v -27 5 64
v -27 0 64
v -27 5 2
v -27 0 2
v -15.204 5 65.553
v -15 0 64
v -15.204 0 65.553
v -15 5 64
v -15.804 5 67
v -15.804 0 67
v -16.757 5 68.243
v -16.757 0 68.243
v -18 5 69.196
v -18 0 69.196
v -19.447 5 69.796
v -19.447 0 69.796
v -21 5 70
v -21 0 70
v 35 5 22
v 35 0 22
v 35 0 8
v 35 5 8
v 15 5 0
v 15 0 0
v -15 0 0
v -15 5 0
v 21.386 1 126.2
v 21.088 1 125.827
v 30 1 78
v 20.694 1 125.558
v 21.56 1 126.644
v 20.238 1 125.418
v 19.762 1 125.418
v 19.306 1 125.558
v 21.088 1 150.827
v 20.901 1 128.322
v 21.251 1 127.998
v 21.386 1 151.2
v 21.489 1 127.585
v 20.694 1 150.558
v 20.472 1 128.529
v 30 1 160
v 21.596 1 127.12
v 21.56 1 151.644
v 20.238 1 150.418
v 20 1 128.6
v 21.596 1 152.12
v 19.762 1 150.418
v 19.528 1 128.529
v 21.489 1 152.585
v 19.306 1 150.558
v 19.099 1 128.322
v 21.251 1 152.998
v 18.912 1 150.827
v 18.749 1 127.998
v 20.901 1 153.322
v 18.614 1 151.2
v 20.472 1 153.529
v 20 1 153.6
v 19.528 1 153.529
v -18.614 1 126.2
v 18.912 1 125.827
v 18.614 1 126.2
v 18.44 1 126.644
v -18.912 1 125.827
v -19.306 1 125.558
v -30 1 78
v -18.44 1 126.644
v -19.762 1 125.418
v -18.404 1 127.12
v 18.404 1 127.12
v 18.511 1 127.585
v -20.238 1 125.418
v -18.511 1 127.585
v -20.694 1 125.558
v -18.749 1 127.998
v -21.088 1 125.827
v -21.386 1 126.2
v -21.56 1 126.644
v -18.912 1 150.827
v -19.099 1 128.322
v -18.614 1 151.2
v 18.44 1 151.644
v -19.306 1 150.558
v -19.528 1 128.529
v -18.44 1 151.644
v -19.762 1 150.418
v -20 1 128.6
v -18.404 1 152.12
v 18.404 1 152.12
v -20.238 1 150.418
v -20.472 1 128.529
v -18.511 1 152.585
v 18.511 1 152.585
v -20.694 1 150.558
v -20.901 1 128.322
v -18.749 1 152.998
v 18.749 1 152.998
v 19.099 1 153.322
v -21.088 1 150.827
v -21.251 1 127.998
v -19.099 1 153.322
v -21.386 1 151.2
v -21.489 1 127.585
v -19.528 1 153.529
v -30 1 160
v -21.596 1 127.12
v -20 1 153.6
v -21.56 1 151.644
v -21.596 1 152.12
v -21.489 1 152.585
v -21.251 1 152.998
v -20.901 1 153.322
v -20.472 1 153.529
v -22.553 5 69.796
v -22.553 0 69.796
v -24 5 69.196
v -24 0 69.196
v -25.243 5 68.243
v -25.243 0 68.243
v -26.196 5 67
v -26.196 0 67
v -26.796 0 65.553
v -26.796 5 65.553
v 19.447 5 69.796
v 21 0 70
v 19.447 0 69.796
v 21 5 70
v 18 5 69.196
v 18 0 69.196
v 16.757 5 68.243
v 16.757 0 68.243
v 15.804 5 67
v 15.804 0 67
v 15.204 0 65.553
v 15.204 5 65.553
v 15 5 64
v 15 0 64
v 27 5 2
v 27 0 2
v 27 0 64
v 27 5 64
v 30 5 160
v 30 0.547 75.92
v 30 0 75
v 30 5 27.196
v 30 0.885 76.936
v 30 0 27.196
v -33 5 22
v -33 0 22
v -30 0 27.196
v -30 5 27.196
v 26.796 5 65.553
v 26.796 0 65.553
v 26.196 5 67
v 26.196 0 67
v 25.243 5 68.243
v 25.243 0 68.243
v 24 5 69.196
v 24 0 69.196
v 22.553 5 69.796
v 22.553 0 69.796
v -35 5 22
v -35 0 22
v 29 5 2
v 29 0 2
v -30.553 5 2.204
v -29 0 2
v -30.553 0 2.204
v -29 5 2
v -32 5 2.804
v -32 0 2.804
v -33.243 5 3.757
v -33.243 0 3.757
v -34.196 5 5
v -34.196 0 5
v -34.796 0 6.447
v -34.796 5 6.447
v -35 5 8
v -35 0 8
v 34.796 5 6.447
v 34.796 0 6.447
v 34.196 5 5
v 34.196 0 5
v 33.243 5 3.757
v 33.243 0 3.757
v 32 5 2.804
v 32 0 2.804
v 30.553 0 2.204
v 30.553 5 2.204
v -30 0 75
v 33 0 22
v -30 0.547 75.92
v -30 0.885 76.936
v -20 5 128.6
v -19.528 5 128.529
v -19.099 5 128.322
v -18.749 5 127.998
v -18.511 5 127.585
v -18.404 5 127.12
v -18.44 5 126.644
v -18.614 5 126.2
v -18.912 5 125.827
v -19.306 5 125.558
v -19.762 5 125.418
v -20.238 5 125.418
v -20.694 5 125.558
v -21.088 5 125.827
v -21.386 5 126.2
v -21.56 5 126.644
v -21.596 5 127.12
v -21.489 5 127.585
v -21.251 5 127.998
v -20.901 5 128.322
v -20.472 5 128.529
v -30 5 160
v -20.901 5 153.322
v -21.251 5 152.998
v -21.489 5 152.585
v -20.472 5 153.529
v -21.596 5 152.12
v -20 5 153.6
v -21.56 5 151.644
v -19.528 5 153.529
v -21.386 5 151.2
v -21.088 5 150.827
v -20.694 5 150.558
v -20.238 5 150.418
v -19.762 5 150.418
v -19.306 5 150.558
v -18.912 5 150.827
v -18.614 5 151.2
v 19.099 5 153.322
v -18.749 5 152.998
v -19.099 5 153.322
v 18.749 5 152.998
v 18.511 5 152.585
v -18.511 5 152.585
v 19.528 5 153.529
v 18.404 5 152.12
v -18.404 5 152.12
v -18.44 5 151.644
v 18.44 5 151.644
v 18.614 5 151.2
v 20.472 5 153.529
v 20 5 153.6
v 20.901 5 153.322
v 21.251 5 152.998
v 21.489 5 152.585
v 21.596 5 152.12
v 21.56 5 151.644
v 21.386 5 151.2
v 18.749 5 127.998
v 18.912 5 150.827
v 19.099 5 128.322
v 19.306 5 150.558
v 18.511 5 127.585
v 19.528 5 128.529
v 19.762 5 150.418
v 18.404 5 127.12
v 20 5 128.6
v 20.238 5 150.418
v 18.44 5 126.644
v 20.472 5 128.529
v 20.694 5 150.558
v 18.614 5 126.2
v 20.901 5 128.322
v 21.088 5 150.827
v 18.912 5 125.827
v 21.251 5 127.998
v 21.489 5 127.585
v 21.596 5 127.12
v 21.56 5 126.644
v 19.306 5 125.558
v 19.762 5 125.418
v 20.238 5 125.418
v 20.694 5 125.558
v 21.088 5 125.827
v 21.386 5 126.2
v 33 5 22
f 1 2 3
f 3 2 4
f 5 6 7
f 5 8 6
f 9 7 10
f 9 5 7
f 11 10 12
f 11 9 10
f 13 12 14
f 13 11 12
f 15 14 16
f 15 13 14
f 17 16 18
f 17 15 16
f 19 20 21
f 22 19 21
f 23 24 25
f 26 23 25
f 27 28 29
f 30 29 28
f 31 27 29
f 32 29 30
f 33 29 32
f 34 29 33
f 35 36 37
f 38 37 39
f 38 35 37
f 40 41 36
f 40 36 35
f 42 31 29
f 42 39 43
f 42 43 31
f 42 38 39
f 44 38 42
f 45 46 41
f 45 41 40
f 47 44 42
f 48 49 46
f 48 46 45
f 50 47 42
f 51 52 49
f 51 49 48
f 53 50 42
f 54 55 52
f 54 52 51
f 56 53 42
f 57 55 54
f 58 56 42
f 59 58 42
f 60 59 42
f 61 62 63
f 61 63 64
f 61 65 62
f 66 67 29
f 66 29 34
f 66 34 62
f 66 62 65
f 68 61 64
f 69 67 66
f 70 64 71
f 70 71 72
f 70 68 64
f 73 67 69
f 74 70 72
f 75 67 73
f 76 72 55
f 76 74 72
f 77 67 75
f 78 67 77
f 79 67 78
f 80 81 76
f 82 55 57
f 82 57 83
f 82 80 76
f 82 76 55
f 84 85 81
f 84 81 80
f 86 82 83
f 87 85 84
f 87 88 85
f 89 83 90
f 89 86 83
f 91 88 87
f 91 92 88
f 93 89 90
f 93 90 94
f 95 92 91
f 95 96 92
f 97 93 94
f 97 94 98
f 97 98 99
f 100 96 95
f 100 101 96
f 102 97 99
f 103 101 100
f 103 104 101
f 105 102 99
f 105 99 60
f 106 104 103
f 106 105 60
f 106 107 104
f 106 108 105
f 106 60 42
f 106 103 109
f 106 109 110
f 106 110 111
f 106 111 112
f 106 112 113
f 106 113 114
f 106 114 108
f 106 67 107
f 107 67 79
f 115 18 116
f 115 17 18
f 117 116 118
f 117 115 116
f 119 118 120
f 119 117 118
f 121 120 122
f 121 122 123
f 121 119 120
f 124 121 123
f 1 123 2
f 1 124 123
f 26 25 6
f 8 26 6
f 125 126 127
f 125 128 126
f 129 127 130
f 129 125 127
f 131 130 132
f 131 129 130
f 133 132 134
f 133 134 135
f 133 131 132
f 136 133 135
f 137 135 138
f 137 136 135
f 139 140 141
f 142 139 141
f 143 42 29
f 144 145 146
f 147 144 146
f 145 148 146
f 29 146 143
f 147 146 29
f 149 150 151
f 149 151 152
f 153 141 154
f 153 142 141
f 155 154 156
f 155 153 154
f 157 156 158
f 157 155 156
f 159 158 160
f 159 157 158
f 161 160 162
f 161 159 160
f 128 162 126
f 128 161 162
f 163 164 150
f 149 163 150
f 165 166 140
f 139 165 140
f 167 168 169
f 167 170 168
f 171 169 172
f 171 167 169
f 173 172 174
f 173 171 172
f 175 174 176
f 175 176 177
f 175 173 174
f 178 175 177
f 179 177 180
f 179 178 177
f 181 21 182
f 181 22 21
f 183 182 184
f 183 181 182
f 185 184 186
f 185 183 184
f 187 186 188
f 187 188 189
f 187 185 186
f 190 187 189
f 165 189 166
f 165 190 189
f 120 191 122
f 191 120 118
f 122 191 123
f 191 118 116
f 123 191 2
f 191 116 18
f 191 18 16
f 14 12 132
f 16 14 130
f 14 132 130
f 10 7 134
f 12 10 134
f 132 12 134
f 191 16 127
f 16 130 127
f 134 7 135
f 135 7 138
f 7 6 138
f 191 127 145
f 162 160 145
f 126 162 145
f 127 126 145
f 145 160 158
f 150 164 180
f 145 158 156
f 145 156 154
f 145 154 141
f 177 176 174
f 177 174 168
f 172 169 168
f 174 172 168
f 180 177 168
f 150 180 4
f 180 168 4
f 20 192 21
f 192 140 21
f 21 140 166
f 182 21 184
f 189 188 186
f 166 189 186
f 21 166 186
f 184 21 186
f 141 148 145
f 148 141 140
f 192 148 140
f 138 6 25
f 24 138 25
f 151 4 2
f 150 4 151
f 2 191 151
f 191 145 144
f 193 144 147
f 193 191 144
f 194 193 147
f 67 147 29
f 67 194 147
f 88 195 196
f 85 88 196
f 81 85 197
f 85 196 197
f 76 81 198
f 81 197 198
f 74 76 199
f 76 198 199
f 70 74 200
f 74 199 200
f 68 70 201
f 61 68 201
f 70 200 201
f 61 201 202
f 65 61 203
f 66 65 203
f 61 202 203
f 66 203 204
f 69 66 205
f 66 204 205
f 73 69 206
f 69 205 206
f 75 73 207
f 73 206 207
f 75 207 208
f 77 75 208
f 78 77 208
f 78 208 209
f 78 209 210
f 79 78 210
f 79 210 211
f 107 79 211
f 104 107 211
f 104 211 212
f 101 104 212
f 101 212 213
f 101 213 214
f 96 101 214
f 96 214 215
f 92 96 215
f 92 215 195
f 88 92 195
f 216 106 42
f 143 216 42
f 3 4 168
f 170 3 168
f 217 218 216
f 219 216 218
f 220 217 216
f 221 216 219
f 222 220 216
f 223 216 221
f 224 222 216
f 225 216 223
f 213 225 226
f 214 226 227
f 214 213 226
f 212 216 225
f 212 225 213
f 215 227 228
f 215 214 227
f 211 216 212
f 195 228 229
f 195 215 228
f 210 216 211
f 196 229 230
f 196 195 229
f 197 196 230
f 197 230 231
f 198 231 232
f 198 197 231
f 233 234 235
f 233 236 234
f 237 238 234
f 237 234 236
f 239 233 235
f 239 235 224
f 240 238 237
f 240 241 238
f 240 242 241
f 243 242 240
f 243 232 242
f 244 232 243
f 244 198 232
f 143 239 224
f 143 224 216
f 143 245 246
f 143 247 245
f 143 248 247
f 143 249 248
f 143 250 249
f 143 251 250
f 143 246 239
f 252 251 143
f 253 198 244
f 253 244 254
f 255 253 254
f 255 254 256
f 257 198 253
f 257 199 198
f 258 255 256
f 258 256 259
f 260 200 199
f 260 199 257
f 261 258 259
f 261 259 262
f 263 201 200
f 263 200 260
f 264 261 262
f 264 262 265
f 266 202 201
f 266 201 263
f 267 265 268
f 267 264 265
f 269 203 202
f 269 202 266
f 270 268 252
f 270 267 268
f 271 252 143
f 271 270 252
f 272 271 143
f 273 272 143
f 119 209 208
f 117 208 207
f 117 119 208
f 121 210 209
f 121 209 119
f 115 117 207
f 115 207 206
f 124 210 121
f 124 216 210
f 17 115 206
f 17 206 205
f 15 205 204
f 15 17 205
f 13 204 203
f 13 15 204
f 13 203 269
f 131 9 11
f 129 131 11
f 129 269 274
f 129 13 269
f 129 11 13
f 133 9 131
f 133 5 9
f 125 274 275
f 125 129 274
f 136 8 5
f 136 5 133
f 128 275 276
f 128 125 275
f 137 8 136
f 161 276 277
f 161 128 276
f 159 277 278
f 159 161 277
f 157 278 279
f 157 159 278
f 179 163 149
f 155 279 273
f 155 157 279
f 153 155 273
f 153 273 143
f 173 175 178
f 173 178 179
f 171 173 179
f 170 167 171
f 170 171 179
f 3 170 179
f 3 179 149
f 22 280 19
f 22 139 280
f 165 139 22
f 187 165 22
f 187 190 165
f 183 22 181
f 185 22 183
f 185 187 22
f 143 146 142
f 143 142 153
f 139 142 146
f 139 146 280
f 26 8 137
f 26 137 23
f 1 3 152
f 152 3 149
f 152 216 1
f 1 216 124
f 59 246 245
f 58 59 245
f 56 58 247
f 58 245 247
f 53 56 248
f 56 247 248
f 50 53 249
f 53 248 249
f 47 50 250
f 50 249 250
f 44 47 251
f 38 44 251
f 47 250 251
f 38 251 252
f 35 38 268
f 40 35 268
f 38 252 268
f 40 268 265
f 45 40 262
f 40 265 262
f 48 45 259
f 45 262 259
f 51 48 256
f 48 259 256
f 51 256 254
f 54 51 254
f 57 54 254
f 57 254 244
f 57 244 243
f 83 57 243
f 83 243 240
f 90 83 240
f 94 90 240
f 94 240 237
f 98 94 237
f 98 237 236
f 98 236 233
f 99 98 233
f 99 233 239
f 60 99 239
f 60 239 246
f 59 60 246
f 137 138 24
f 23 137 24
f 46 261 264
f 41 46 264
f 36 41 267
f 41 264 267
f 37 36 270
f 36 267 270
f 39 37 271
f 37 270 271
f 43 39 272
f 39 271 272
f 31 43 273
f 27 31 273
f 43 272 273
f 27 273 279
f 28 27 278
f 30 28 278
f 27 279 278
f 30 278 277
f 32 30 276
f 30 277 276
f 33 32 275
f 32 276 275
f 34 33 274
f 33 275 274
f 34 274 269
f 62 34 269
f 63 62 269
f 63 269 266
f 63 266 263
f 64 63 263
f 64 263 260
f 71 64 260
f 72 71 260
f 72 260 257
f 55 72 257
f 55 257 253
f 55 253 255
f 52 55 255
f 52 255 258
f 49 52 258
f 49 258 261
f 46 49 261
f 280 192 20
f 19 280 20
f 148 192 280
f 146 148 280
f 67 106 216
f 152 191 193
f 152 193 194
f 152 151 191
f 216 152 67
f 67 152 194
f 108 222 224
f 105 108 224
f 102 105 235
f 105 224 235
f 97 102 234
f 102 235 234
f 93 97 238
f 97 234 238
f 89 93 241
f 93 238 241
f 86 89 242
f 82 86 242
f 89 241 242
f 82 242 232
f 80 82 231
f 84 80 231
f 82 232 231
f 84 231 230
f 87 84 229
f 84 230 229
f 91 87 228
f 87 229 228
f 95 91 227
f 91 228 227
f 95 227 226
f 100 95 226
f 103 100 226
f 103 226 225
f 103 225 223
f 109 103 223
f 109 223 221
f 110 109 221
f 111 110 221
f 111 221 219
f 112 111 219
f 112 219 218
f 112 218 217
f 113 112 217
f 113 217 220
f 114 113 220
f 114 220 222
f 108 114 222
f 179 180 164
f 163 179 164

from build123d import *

# Parameters (mm, degrees)
BOSS_EXTRUDE1_DEPTH = 5
FILLET1_R           = 6
CHAMFER1_SIZE       = 3
CHAMFER1_SIZE2      = 5.196152423
CHAMFER2_SIZE       = 3
CHAMFER2_SIZE2      = 5.196152423
CUT_EXTRUDE1_REACH  = 165.86
SKETCH4_R           = 1.6
CUT_EXTRUDE2_REACH  = 174.772
SKETCH5_W           = 85
SKETCH5_H           = 1
FILLET3_R           = 5


# Some blends are built 0.0001 mm under size
with BuildPart() as part:
    # Sketch2 → Boss-Extrude1 (new body)
    with BuildSketch(Plane(origin=(0, 0, 0), x_dir=(1, 0, 0), z_dir=(0, 1, 0))):
        Polygon((15, 0), (-15, 0), (-15, -70), (-27, -70), (-27, -2), (-35, -2), (-35, -22), (-30, -22), (-30, -160), (30, -160), (30, -22), (35, -22), (35, -2), (27, -2), (27, -70), (15, -70), align=None)
    extrude(amount=BOSS_EXTRUDE1_DEPTH)

    # Fillet1
    fillet1_edges = [part.edges().sort_by_distance(p)[0] for p in [
        (-27, 2.5, 70),
        (-15, 2.5, 70),
        (15, 2.5, 70),
        (27, 2.5, 70),
        (-35, 2.5, 2),
        (35, 2.5, 2),
    ]]
    fillet(fillet1_edges, radius=FILLET1_R - 0.0001)  # a hair under: the kernel refuses the full size

    # Chamfer1
    chamfer1_edges = [part.edges().sort_by_distance(p)[0] for p in [
        (-30, 2.5, 22),
    ]]
    chamfer1_side = [part.faces().sort_by_distance(p)[0] for p in [
        (-32.5, 2.5, 22),
    ]]
    chamfer(chamfer1_edges, length=CHAMFER1_SIZE, length2=CHAMFER1_SIZE2, reference=chamfer1_side[0])

    # Chamfer2
    chamfer2_edges = [part.edges().sort_by_distance(p)[0] for p in [
        (30, 2.5, 22),
    ]]
    chamfer2_side = [part.faces().sort_by_distance(p)[0] for p in [
        (32.5, 2.5, 22),
    ]]
    chamfer(chamfer2_edges, length=CHAMFER2_SIZE, length2=CHAMFER2_SIZE2, reference=chamfer2_side[0])

    # Sketch4 → Cut-Extrude1 (cut, up to next)
    with BuildSketch(Plane(origin=(0, 5, 0), x_dir=(1, 0, 0), z_dir=(0, 1, 0)), mode=Mode.PRIVATE) as cut_extrude1_sk1:
        with Locations(Location((-20, -152, 0), (0, 0, 270))):
            Circle(SKETCH4_R)
    cut_extrude1_tool1 = extrude(cut_extrude1_sk1.sketch, amount=-CUT_EXTRUDE1_REACH, mode=Mode.PRIVATE) & part.part
    # Sketch4 → Cut-Extrude1 (cut, up to next)
    with BuildSketch(Plane(origin=(0, 5, 0), x_dir=(1, 0, 0), z_dir=(0, 1, 0)), mode=Mode.PRIVATE) as cut_extrude1_sk2:
        with Locations(Location((20, -152, 0), (0, 0, 270))):
            Circle(SKETCH4_R)
    cut_extrude1_tool2 = extrude(cut_extrude1_sk2.sketch, amount=-CUT_EXTRUDE1_REACH, mode=Mode.PRIVATE) & part.part
    # Sketch4 → Cut-Extrude1 (cut, up to next)
    with BuildSketch(Plane(origin=(0, 5, 0), x_dir=(1, 0, 0), z_dir=(0, 1, 0)), mode=Mode.PRIVATE) as cut_extrude1_sk3:
        with Locations(Location((-20, -127, 0), (0, 0, 270))):
            Circle(SKETCH4_R)
    cut_extrude1_tool3 = extrude(cut_extrude1_sk3.sketch, amount=-CUT_EXTRUDE1_REACH, mode=Mode.PRIVATE) & part.part
    # Sketch4 → Cut-Extrude1 (cut, up to next)
    with BuildSketch(Plane(origin=(0, 5, 0), x_dir=(1, 0, 0), z_dir=(0, 1, 0)), mode=Mode.PRIVATE) as cut_extrude1_sk4:
        with Locations(Location((20, -127, 0), (0, 0, 270))):
            Circle(SKETCH4_R)
    cut_extrude1_tool4 = extrude(cut_extrude1_sk4.sketch, amount=-CUT_EXTRUDE1_REACH, mode=Mode.PRIVATE) & part.part
    add(cut_extrude1_tool1.solids().sort_by_distance((-20, 5, 152))[0], mode=Mode.SUBTRACT)
    add(cut_extrude1_tool2.solids().sort_by_distance((20, 5, 152))[0], mode=Mode.SUBTRACT)
    add(cut_extrude1_tool3.solids().sort_by_distance((-20, 5, 127))[0], mode=Mode.SUBTRACT)
    add(cut_extrude1_tool4.solids().sort_by_distance((20, 5, 127))[0], mode=Mode.SUBTRACT)

    # Sketch5 → Cut-Extrude2 (cut, up to next)
    with BuildSketch(Plane.ZY.offset(30), mode=Mode.PRIVATE) as cut_extrude2_sk1:
        with Locations((117.5, 0.5)):
            Rectangle(SKETCH5_W, SKETCH5_H)
    cut_extrude2_tool1 = extrude(cut_extrude2_sk1.sketch, amount=-CUT_EXTRUDE2_REACH, mode=Mode.PRIVATE) & part.part
    add(cut_extrude2_tool1.solids().sort_by_distance((-30, 0.5, 117.5))[0], mode=Mode.SUBTRACT)

    # Fillet3
    # the kernel refuses this fillet: 5 mm, written as the material it adds along each edge
    with BuildSketch(Plane(origin=(-30, 1, 75), x_dir=(0, -1, 0), z_dir=(1, 0, 0))) as fillet3_piece_1:
        with BuildLine():
            CenterArc((5, -3), FILLET3_R, 143.130102354, 36.869897646)
            Line((0, -3), (-0.1, -3))
            Line((-0.1, -3), (-0.1, 0))
            Line((-0.1, 0), (0, 0.1))
            ThreePointArc((0, 0.1), (0.5, 0.1), (0.92, 0.06))
            Line((0.92, 0.06), (1, 0))
        make_face()
    extrude(amount=60)


solid = part.part
